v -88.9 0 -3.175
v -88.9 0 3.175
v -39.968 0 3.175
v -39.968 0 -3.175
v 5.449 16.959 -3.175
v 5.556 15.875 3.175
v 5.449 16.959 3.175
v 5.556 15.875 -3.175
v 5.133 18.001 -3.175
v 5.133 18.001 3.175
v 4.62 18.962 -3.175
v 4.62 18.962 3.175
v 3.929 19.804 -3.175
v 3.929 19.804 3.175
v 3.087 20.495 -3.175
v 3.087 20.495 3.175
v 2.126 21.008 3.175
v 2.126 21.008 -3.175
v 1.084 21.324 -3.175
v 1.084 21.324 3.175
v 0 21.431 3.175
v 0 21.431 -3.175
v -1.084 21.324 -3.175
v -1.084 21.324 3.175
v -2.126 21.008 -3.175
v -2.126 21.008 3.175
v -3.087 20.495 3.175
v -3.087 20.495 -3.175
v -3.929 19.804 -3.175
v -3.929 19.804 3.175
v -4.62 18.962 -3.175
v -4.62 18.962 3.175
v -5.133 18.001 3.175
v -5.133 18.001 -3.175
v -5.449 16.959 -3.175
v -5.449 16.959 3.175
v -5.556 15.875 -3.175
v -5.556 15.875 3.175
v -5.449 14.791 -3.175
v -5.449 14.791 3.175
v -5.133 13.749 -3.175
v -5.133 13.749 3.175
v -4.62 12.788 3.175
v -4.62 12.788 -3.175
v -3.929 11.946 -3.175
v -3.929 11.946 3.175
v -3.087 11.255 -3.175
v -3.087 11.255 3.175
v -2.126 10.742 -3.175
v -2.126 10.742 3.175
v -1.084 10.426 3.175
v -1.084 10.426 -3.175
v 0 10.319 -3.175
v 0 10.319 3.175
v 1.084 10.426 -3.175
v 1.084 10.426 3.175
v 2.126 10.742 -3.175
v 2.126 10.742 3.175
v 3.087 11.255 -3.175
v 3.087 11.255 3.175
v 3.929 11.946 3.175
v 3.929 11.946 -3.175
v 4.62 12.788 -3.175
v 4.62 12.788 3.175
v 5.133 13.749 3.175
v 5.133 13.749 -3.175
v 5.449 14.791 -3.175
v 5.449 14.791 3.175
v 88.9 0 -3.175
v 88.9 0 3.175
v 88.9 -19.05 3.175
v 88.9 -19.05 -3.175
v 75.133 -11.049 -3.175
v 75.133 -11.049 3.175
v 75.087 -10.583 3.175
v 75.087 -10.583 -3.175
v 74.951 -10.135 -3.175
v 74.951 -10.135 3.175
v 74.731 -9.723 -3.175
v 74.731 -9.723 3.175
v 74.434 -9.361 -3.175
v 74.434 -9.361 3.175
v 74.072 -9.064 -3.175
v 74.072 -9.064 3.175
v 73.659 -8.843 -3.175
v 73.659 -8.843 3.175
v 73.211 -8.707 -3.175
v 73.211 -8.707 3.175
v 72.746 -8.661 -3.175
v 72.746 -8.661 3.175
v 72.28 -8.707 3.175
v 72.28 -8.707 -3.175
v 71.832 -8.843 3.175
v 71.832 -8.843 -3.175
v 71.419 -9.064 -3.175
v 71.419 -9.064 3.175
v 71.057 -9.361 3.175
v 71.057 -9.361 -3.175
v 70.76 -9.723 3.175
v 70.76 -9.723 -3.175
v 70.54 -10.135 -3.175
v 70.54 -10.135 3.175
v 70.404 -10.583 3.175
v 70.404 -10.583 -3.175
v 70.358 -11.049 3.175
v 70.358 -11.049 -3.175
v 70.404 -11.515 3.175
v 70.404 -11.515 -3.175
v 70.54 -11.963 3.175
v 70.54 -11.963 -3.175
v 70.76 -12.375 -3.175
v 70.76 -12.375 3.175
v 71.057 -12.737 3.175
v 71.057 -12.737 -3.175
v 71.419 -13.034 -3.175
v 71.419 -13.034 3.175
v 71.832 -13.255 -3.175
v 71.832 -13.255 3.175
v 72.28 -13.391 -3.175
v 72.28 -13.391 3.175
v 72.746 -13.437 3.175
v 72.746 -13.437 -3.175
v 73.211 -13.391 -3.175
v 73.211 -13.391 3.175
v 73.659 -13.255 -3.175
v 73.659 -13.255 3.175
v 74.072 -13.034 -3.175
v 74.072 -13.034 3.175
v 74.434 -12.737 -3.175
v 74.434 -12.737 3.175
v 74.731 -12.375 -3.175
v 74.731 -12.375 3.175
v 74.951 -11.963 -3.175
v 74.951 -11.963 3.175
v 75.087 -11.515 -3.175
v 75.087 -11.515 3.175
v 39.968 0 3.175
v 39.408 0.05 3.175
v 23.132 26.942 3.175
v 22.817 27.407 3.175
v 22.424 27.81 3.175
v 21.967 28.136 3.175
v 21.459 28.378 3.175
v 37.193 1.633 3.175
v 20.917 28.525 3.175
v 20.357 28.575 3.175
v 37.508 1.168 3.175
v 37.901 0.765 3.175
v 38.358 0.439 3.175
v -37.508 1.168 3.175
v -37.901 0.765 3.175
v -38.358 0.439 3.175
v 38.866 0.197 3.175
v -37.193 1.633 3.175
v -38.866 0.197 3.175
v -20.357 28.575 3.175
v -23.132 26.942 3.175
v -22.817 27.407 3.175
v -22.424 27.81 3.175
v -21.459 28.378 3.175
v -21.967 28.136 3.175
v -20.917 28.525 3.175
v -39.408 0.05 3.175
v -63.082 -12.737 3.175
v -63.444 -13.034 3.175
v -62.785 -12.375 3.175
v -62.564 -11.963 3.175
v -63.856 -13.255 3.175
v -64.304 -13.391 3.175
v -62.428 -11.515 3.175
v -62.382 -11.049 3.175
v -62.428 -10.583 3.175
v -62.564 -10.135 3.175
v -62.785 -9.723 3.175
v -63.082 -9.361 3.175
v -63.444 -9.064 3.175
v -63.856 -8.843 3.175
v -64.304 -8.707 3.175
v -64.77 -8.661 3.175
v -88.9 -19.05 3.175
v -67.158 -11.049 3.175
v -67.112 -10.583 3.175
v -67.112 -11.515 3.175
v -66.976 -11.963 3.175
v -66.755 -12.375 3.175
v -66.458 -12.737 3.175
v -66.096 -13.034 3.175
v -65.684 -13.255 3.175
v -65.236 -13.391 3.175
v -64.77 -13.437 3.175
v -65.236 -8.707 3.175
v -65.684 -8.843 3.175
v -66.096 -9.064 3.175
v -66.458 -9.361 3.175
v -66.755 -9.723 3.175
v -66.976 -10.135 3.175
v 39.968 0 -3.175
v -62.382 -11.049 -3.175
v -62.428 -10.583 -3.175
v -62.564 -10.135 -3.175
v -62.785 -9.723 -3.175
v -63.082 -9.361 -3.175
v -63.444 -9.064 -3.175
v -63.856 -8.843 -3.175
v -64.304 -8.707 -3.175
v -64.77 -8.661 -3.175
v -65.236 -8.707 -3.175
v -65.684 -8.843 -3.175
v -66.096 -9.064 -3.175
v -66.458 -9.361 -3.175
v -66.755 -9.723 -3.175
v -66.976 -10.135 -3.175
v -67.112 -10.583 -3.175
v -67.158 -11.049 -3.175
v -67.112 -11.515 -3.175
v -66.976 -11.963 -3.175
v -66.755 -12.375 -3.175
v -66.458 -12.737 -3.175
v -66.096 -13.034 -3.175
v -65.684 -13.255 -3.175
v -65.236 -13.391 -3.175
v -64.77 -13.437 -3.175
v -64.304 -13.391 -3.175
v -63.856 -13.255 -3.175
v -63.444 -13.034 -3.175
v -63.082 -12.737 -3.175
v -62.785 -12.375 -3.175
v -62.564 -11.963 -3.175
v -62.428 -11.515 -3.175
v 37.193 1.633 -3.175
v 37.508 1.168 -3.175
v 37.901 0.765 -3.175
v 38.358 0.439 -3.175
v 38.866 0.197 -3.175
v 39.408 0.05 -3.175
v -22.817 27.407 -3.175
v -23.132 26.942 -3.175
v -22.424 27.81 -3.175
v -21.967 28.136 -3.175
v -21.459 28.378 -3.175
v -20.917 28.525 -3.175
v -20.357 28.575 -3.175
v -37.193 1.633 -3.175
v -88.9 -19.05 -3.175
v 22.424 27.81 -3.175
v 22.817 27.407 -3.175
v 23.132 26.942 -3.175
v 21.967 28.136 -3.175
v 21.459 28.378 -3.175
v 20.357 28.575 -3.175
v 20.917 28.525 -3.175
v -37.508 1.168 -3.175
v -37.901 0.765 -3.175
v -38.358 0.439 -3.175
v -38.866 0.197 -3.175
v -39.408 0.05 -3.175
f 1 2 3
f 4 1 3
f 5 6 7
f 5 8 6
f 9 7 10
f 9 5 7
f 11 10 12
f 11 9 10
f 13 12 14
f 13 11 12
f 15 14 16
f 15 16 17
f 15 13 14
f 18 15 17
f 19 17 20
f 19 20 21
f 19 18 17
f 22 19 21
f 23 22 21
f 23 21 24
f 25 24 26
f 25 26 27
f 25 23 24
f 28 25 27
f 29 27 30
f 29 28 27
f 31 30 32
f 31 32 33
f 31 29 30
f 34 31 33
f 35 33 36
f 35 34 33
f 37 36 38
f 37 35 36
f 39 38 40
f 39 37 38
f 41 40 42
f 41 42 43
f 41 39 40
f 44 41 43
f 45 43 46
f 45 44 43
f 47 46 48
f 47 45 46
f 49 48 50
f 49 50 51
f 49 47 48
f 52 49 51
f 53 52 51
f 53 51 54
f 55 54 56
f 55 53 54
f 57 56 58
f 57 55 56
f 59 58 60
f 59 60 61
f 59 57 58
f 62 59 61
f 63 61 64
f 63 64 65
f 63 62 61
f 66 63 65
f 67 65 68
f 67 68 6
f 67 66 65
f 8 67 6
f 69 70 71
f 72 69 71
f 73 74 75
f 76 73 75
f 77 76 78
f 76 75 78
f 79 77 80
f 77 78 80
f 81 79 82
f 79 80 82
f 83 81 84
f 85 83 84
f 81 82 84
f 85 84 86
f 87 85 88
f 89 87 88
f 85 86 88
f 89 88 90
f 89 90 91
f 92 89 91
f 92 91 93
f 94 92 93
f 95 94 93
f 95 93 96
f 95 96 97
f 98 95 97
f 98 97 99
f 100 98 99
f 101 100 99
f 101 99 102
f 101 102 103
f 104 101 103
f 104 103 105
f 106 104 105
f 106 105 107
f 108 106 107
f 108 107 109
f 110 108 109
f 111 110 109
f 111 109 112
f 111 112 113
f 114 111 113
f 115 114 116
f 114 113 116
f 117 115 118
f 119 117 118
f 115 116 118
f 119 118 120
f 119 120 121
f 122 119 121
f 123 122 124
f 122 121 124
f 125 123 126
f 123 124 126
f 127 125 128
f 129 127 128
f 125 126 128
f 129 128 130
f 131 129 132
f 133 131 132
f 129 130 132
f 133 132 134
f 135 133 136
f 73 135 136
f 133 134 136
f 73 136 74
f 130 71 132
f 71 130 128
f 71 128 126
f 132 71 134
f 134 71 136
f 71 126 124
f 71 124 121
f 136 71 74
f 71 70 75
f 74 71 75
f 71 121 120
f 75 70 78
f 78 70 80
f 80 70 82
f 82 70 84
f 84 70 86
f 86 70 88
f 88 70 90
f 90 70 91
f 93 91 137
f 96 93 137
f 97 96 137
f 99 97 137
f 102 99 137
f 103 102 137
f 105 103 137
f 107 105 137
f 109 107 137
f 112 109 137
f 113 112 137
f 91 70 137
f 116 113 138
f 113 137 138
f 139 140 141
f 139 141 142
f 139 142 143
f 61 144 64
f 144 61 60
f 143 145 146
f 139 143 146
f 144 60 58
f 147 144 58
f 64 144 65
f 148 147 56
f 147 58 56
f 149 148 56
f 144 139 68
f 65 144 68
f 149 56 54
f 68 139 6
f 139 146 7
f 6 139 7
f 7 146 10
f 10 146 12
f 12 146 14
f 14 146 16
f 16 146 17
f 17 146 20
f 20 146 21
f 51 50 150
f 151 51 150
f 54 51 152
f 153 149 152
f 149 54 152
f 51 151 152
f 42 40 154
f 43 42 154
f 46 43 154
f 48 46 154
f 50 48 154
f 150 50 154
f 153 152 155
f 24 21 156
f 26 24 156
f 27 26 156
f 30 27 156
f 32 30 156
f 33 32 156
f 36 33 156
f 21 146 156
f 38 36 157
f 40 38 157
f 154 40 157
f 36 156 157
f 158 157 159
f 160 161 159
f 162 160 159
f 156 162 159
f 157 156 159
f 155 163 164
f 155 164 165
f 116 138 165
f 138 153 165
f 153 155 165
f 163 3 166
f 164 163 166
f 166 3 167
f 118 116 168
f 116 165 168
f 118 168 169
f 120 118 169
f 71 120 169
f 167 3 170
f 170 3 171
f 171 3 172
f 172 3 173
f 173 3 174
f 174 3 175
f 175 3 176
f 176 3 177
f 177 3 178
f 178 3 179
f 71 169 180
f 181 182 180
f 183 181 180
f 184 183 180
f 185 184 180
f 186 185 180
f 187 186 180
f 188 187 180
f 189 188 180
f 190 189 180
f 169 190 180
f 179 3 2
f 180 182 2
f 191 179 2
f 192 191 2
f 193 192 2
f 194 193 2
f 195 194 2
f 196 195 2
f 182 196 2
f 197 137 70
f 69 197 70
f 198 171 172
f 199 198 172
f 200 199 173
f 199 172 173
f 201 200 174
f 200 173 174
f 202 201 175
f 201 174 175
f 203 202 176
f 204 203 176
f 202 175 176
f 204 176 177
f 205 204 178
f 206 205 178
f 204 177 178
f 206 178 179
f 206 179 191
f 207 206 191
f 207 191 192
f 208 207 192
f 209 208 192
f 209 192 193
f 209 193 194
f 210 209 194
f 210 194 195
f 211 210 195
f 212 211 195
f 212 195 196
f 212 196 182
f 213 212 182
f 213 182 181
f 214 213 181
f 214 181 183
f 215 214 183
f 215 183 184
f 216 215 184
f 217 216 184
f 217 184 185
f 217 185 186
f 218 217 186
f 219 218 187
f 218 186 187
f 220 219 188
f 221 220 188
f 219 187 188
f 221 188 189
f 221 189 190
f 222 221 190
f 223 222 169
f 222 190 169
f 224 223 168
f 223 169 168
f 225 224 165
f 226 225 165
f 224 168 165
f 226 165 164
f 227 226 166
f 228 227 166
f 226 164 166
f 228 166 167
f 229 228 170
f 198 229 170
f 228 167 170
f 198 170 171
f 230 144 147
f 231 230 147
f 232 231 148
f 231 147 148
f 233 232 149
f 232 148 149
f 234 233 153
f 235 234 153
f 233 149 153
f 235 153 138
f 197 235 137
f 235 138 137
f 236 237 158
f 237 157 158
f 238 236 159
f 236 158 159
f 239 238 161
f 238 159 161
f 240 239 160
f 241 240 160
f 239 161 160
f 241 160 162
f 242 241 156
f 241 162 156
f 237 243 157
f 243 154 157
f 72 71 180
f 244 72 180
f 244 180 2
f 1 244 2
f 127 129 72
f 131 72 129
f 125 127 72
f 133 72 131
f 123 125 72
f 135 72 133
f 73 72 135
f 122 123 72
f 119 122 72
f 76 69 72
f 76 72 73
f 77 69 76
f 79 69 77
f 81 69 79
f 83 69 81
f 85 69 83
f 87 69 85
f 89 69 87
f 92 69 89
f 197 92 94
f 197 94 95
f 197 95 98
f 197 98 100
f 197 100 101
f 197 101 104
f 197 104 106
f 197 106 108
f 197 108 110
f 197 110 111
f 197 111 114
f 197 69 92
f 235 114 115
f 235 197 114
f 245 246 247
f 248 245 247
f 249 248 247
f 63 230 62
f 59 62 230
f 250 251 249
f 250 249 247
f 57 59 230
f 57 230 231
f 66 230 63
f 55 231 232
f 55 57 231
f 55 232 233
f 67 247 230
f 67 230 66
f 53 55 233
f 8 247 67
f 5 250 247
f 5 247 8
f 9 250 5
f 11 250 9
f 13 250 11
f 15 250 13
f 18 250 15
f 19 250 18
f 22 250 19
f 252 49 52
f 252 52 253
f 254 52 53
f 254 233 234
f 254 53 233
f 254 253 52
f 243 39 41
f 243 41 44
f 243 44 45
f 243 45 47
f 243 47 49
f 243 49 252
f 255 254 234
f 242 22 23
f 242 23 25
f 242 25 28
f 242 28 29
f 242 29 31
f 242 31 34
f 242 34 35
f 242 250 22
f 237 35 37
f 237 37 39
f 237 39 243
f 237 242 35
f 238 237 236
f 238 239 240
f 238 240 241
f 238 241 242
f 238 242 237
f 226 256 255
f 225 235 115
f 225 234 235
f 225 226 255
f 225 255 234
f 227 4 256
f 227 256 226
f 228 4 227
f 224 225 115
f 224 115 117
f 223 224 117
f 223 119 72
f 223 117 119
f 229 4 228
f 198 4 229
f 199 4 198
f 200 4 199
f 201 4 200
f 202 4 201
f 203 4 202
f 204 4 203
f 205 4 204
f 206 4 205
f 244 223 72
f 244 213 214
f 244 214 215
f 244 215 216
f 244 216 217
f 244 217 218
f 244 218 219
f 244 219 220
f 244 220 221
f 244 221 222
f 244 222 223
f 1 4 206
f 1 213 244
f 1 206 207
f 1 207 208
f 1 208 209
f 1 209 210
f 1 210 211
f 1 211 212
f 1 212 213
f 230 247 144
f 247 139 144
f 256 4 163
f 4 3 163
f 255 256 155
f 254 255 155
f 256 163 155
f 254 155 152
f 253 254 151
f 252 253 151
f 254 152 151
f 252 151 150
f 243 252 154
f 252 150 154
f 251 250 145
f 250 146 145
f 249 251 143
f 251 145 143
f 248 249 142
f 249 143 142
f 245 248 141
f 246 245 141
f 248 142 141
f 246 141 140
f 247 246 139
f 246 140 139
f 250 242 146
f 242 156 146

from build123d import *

# Parameters (mm, degrees)
SKETCH1_R           = 5.55625
BOSS_EXTRUDE1_DEPTH = 3.175
SKETCH2_R           = 2.3876
CUT_EXTRUDE1_DEPTH  = 7.35


with BuildPart() as part:
    # Sketch1 → Boss-Extrude1 (new body, symmetric)
    with BuildSketch(Plane.XY):
        with BuildLine():
            Line((-88.9, 0), (-39.968180633, 0))
            ThreePointArc((-39.968180633, 0), (-38.358050091, 0.438559861), (-37.192731281, 1.633083694))
            Line((-37.192731281, 1.633083694), (-23.132268719, 26.941916306))
            ThreePointArc((-23.132268719, 26.941916306), (-21.966949909, 28.136440139), (-20.356819367, 28.575))
            Line((-20.356819367, 28.575), (20.356819367, 28.575))
            ThreePointArc((20.356819367, 28.575), (21.966949909, 28.136440139), (23.132268719, 26.941916306))
            Line((23.132268719, 26.941916306), (37.192731281, 1.633083694))
            ThreePointArc((37.192731281, 1.633083694), (38.358050091, 0.438559861), (39.968180633, 0))
            Line((39.968180633, 0), (88.9, 0))
            Line((88.9, 0), (88.9, -19.05))
            Line((88.9, -19.05), (-88.9, -19.05))
            Line((-88.9, -19.05), (-88.9, 0))
        make_face()
        with Locations((0, 15.875)):
            Circle(SKETCH1_R, mode=Mode.SUBTRACT)
    extrude(amount=BOSS_EXTRUDE1_DEPTH, both=True)

    # Sketch2 → Cut-Extrude1 (cut, through all)
    with BuildSketch(Plane.XY.offset(3.175)):
        with Locations((-64.77, -11.049)):
            Circle(SKETCH2_R)
        with Locations((72.7456, -11.049)):
            Circle(SKETCH2_R)
    extrude(amount=-CUT_EXTRUDE1_DEPTH, mode=Mode.SUBTRACT)


solid = part.part
